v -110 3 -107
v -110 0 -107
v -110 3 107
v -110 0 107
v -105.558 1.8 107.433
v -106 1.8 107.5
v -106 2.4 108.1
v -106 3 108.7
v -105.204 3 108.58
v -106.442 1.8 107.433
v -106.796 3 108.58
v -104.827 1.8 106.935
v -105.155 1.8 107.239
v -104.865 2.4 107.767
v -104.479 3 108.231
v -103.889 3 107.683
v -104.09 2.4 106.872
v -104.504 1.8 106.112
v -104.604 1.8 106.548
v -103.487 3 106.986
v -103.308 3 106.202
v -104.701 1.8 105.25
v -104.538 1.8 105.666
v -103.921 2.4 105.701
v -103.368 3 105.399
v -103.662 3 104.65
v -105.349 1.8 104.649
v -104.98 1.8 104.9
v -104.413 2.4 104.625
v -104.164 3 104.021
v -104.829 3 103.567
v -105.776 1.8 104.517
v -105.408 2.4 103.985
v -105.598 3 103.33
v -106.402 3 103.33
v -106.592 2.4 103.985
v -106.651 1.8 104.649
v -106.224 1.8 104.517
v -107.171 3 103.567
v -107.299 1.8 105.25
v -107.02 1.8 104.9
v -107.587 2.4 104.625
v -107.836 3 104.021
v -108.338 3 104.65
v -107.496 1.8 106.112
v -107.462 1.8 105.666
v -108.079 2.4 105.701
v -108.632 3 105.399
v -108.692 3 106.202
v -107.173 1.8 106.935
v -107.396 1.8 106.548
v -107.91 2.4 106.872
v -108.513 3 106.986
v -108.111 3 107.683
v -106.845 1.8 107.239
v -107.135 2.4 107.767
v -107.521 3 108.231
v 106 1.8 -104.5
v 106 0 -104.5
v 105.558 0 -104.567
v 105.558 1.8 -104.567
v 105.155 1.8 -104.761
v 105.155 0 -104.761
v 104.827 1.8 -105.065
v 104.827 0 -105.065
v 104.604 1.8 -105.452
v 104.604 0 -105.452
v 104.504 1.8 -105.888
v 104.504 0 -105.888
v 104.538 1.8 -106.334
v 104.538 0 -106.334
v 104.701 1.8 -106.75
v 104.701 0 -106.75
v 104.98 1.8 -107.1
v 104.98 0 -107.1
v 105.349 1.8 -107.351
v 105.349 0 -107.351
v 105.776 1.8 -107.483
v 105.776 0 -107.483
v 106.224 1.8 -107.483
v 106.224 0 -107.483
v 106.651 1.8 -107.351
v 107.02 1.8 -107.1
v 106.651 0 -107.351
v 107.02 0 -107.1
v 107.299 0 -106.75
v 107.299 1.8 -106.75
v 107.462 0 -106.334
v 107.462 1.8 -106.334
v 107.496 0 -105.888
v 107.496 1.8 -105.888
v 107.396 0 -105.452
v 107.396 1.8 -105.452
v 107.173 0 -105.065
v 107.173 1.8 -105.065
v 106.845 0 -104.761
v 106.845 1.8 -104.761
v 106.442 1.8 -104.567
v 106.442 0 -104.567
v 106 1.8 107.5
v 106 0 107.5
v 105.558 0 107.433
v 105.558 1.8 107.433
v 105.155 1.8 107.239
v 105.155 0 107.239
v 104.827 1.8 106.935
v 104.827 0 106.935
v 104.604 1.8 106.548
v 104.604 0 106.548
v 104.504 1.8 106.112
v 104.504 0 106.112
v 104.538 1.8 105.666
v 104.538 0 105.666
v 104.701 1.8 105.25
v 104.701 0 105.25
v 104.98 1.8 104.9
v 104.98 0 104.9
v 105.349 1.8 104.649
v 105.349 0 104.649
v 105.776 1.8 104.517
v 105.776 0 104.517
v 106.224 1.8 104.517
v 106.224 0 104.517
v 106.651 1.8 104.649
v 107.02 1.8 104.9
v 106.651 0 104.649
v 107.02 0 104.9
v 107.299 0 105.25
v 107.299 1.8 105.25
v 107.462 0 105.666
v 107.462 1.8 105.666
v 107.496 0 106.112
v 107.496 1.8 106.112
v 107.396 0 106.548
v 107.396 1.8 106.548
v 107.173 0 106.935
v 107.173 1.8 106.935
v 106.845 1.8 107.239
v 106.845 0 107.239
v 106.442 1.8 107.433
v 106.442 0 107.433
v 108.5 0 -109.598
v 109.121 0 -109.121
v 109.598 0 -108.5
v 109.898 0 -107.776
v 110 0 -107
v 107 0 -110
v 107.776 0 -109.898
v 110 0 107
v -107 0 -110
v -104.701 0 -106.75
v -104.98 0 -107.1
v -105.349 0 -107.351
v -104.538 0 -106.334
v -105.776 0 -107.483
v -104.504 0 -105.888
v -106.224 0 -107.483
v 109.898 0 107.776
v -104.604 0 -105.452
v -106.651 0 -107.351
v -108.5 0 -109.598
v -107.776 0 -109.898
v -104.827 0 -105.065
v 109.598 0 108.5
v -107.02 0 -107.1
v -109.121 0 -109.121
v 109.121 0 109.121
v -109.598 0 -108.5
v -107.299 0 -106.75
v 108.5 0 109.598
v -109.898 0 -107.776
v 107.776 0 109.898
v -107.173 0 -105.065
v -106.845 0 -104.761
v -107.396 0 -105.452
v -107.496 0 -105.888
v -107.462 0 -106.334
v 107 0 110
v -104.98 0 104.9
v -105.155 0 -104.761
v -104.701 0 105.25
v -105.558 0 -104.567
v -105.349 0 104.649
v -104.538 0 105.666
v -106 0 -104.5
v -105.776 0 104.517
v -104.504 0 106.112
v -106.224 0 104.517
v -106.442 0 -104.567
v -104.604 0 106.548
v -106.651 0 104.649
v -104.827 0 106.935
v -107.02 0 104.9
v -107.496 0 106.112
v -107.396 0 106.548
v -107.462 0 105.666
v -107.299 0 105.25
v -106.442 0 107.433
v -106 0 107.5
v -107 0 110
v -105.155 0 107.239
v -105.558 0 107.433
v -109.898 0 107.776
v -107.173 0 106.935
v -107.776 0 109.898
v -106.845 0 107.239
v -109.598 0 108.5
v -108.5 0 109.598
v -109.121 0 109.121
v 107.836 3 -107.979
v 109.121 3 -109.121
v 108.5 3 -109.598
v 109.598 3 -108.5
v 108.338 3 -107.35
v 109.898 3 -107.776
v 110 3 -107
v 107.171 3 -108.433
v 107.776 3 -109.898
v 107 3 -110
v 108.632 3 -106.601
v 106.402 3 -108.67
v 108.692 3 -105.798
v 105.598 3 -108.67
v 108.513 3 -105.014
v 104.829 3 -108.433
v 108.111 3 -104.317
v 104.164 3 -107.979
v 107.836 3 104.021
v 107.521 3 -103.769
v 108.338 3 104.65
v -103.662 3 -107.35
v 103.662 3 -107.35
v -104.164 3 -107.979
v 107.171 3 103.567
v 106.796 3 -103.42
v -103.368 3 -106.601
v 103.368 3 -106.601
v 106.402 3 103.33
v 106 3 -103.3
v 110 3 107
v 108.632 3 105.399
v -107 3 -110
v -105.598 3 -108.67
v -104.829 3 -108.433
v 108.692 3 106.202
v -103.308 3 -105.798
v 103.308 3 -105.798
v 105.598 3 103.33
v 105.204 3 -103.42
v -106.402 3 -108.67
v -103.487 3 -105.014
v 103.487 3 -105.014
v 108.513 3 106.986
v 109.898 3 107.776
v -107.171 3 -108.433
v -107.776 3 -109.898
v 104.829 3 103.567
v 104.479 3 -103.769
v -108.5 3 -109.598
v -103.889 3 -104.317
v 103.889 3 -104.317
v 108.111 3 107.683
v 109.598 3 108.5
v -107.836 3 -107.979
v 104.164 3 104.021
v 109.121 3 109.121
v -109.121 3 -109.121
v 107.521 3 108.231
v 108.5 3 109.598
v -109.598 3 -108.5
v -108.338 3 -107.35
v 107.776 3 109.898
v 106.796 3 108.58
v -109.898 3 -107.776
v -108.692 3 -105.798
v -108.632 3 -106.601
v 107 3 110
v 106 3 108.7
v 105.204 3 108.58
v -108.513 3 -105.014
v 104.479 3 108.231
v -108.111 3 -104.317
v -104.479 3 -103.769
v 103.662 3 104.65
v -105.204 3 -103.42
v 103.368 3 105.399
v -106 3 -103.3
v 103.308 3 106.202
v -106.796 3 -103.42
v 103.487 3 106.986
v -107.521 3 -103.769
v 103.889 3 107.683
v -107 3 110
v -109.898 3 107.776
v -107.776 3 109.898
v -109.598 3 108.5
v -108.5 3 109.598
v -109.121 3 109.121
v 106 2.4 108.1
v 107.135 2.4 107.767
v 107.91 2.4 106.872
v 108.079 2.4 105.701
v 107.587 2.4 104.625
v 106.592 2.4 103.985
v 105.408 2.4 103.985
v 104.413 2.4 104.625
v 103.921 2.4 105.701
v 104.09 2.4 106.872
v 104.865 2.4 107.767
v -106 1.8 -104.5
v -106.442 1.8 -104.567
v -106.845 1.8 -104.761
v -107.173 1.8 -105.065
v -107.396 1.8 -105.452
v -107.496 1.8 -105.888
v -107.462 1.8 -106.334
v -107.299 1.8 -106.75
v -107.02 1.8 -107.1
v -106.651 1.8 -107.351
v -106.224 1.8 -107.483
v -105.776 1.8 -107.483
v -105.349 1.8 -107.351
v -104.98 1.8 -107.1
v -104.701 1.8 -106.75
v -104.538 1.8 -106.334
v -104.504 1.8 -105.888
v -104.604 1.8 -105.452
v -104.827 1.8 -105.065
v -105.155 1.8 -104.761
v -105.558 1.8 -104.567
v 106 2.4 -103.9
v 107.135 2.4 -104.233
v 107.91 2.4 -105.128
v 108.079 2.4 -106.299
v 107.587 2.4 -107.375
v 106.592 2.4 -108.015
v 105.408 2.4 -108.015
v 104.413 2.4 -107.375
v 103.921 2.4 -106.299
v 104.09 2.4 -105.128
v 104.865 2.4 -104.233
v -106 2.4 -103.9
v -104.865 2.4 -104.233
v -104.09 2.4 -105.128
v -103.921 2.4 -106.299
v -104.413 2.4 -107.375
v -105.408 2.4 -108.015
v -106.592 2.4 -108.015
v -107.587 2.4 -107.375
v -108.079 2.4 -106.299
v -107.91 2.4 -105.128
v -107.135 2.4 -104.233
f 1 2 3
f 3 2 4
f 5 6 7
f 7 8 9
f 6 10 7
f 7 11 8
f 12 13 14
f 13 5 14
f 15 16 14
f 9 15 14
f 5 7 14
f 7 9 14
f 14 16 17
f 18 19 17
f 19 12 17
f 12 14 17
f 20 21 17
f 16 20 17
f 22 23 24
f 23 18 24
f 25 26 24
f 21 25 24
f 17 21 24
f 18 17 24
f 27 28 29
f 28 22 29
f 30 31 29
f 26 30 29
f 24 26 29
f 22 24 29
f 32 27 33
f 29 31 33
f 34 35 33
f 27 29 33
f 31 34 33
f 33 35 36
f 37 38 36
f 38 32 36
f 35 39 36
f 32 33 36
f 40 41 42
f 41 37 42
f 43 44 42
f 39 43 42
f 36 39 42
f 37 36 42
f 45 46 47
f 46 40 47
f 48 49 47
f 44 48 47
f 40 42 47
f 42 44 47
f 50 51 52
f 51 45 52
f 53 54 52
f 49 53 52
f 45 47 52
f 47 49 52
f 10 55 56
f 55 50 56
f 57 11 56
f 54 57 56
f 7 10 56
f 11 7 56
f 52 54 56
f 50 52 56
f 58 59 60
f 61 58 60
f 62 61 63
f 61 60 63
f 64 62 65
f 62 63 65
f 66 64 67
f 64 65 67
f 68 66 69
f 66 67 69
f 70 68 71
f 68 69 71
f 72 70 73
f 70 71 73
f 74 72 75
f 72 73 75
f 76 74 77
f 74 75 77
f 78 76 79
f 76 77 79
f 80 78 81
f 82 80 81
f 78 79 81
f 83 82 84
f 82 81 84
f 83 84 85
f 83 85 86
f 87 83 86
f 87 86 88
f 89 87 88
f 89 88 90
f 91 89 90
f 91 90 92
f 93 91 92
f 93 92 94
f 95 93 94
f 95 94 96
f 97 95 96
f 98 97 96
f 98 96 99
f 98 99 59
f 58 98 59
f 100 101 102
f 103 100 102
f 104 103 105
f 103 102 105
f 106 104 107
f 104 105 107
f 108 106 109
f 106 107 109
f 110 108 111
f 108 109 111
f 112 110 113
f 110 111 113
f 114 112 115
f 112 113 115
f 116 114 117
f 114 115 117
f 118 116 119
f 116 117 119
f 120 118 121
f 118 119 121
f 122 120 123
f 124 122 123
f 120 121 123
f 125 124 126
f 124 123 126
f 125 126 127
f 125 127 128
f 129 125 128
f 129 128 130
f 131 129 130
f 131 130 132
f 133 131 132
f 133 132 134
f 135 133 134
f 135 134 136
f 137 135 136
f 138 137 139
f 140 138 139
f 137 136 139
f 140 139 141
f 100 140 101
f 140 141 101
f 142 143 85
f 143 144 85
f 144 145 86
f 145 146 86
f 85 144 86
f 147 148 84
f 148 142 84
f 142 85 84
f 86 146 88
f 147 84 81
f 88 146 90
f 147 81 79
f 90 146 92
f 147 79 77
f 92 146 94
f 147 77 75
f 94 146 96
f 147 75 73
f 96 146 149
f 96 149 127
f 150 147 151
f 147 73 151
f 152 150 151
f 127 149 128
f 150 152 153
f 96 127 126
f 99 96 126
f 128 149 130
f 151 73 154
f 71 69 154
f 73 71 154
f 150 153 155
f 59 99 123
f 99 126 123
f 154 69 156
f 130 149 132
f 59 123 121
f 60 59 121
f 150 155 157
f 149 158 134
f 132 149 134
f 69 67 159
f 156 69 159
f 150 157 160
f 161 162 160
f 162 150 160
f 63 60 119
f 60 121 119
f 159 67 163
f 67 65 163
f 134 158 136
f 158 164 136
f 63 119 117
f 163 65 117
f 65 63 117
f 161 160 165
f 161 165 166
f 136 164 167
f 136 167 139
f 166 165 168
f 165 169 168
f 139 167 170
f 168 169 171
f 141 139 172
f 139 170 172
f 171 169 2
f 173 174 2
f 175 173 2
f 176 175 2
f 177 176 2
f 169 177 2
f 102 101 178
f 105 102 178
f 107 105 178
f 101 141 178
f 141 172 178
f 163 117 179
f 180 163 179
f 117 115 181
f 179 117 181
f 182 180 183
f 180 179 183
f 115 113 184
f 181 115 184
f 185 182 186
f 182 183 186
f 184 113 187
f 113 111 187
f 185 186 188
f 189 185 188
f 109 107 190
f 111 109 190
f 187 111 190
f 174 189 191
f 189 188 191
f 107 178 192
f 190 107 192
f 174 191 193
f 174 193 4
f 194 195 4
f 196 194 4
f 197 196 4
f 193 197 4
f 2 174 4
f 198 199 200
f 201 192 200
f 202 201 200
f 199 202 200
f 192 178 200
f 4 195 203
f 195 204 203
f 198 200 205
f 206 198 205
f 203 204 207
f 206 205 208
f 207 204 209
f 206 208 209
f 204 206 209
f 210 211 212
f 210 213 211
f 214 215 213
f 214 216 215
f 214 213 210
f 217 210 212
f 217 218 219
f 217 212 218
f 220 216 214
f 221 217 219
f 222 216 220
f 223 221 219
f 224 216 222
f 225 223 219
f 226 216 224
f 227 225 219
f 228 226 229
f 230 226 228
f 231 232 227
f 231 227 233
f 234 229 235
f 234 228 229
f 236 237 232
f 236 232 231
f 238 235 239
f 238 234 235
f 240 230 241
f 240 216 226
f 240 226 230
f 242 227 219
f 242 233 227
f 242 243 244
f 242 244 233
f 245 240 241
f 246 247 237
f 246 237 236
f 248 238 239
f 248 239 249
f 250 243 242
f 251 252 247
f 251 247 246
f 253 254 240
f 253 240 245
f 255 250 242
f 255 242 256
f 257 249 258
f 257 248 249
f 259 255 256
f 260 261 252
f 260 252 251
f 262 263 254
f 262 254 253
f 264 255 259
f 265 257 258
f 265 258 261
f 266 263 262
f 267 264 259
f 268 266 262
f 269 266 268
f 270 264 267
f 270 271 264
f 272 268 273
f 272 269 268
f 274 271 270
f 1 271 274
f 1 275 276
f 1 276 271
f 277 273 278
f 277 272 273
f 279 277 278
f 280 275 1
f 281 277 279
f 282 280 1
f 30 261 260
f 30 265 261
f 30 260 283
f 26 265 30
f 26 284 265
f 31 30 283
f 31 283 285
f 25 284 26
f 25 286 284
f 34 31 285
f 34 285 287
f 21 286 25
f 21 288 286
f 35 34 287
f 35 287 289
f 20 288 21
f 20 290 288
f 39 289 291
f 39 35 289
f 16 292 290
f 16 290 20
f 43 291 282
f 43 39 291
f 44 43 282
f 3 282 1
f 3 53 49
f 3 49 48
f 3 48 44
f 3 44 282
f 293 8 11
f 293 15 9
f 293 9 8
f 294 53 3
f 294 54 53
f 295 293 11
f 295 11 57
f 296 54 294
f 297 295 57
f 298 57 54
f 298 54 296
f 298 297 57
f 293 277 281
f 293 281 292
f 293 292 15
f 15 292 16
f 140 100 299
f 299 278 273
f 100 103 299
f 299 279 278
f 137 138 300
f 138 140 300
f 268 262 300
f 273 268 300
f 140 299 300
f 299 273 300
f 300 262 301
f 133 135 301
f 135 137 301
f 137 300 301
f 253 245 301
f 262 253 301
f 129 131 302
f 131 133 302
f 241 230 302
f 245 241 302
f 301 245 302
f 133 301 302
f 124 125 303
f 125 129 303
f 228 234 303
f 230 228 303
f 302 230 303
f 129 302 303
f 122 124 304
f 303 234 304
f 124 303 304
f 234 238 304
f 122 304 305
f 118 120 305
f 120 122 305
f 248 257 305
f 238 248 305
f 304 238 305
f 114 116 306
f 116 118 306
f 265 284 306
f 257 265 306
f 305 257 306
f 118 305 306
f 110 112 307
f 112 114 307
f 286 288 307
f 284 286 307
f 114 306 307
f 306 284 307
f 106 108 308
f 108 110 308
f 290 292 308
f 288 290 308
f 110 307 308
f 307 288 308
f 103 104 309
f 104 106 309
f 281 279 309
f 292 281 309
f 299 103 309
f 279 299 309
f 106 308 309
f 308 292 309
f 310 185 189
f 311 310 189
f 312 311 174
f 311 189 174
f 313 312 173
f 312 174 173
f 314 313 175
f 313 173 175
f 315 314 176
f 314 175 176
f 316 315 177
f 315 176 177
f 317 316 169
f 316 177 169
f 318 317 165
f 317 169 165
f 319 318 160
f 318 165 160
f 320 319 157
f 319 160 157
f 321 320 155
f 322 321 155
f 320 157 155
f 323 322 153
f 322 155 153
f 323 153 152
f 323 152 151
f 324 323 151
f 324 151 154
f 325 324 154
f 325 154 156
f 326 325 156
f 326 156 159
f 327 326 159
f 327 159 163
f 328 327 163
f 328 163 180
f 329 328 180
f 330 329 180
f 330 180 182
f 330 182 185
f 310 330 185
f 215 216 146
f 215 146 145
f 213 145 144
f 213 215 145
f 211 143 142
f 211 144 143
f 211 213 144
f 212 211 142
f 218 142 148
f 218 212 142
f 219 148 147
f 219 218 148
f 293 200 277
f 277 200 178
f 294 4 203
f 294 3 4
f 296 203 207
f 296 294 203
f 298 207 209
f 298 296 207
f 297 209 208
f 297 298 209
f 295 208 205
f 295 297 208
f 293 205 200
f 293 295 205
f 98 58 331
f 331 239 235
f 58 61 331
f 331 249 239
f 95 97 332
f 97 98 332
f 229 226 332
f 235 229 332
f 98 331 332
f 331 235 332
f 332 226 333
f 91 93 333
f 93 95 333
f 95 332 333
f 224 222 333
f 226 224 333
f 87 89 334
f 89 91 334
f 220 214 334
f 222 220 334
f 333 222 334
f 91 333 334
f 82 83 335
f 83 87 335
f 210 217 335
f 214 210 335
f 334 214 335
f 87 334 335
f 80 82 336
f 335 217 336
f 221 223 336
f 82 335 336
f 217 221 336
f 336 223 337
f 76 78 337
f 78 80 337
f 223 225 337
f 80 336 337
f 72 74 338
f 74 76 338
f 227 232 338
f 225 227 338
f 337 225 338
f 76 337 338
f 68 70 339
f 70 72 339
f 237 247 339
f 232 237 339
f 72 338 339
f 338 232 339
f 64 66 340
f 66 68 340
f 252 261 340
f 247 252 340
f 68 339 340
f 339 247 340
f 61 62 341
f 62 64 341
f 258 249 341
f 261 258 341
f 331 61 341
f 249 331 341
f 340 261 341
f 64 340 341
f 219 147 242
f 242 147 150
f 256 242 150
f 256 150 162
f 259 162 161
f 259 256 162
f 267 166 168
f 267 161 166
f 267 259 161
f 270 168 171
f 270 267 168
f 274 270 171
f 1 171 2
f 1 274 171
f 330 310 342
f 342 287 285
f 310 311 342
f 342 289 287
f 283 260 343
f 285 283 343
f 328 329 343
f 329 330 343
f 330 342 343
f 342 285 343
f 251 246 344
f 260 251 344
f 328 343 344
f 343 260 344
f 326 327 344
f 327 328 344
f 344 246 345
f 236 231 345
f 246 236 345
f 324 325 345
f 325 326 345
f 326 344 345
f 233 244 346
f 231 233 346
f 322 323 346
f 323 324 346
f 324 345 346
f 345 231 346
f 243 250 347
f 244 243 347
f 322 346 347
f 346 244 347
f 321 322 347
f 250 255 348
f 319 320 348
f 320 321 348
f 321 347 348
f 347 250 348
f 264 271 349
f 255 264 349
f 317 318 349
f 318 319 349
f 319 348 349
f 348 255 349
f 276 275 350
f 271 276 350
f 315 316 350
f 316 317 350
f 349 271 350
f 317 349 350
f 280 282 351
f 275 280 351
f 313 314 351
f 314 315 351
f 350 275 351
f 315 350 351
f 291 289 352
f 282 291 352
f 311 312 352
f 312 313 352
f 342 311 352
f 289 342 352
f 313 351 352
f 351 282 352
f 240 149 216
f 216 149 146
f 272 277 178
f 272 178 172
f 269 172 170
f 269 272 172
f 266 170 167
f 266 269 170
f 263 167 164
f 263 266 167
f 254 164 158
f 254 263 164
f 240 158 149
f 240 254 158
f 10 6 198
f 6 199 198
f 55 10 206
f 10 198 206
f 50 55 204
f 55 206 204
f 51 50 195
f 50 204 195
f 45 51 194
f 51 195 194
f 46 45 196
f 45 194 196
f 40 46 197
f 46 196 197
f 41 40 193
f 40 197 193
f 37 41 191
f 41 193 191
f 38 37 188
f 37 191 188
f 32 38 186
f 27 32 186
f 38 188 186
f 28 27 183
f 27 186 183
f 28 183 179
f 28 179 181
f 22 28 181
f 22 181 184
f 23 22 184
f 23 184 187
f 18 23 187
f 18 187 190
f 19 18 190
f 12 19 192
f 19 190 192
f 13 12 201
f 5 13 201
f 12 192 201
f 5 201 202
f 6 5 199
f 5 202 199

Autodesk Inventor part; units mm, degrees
ref_plane "YZ Plane" through (0, 0, 0) normal (1, 0, 0) x (0, 1, 0)
ref_plane "XZ Plane" through (0, 0, 0) normal (0, 1, 0) x (-1, 0, 0)
ref_plane "XY Plane" through (0, 0, 0) normal (0, 0, 1) x (1, 0, 0)
sketch "Szkic1" plane through (0, 0, 0) normal (0, 1, 0) x (-1, 0, 0)
  line L0 (110, 110) -> (-110, 110)
  line L1 (-110, 110) -> (-110, -110)
  line L2 (-110, -110) -> (110, -110)
  line L3 (110, -110) -> (110, 110)
  line L4 (110, 0) -> (-110, 0) construction
  line L5 (0, 110) -> (0, -110) construction
  point P0 (0, 0)
  dimension "d0" = 220
  dimension "d1" = 220
extrude "Wyciągnięcie proste1" add sketch "Szkic1" along normal blind 3
sketch "Szkic2" plane through (0, 3, 0) normal (0, 1, 0) x (1, 0, 0)
  line L0 (-110, 110) -> (-110, -110) projected
  line L1 (-110, -110) -> (110, -110) projected
  line L2 (110, -110) -> (110, 110) projected
  line L3 (110, 110) -> (-110, 110) projected
  point P0 (0, 0)
  point P1 (-106, -106)
  point P2 (-106, 106)
  point P3 (106, 106)
  point P4 (106, -106)
  dimension "d4" = 4
  dimension "d5" = 4
  dimension "d6" = 4
  dimension "d7" = 4
hole "Otwór1" at (-106, 3, 106) at (-106, 3, -106) at (106, 3, -106) at (106, 3, 106) direction (0, -1, 0) diameter 3 end through all
fillet "Zaokrąglenie1" radius 3 4 edges at (-110, 1.5, 110) (110, 1.5, 110) (110, 1.5, -110) (-110, 1.5, -110)
chamfer "Faza1" distance 1.2 angle 45 4 edges at (106, 3, -107.5) (-106, 3, -107.5) (106, 3, 104.5) (-106, 3, 104.5)
properties part number "20_stół" material "Aluminum 6061"
